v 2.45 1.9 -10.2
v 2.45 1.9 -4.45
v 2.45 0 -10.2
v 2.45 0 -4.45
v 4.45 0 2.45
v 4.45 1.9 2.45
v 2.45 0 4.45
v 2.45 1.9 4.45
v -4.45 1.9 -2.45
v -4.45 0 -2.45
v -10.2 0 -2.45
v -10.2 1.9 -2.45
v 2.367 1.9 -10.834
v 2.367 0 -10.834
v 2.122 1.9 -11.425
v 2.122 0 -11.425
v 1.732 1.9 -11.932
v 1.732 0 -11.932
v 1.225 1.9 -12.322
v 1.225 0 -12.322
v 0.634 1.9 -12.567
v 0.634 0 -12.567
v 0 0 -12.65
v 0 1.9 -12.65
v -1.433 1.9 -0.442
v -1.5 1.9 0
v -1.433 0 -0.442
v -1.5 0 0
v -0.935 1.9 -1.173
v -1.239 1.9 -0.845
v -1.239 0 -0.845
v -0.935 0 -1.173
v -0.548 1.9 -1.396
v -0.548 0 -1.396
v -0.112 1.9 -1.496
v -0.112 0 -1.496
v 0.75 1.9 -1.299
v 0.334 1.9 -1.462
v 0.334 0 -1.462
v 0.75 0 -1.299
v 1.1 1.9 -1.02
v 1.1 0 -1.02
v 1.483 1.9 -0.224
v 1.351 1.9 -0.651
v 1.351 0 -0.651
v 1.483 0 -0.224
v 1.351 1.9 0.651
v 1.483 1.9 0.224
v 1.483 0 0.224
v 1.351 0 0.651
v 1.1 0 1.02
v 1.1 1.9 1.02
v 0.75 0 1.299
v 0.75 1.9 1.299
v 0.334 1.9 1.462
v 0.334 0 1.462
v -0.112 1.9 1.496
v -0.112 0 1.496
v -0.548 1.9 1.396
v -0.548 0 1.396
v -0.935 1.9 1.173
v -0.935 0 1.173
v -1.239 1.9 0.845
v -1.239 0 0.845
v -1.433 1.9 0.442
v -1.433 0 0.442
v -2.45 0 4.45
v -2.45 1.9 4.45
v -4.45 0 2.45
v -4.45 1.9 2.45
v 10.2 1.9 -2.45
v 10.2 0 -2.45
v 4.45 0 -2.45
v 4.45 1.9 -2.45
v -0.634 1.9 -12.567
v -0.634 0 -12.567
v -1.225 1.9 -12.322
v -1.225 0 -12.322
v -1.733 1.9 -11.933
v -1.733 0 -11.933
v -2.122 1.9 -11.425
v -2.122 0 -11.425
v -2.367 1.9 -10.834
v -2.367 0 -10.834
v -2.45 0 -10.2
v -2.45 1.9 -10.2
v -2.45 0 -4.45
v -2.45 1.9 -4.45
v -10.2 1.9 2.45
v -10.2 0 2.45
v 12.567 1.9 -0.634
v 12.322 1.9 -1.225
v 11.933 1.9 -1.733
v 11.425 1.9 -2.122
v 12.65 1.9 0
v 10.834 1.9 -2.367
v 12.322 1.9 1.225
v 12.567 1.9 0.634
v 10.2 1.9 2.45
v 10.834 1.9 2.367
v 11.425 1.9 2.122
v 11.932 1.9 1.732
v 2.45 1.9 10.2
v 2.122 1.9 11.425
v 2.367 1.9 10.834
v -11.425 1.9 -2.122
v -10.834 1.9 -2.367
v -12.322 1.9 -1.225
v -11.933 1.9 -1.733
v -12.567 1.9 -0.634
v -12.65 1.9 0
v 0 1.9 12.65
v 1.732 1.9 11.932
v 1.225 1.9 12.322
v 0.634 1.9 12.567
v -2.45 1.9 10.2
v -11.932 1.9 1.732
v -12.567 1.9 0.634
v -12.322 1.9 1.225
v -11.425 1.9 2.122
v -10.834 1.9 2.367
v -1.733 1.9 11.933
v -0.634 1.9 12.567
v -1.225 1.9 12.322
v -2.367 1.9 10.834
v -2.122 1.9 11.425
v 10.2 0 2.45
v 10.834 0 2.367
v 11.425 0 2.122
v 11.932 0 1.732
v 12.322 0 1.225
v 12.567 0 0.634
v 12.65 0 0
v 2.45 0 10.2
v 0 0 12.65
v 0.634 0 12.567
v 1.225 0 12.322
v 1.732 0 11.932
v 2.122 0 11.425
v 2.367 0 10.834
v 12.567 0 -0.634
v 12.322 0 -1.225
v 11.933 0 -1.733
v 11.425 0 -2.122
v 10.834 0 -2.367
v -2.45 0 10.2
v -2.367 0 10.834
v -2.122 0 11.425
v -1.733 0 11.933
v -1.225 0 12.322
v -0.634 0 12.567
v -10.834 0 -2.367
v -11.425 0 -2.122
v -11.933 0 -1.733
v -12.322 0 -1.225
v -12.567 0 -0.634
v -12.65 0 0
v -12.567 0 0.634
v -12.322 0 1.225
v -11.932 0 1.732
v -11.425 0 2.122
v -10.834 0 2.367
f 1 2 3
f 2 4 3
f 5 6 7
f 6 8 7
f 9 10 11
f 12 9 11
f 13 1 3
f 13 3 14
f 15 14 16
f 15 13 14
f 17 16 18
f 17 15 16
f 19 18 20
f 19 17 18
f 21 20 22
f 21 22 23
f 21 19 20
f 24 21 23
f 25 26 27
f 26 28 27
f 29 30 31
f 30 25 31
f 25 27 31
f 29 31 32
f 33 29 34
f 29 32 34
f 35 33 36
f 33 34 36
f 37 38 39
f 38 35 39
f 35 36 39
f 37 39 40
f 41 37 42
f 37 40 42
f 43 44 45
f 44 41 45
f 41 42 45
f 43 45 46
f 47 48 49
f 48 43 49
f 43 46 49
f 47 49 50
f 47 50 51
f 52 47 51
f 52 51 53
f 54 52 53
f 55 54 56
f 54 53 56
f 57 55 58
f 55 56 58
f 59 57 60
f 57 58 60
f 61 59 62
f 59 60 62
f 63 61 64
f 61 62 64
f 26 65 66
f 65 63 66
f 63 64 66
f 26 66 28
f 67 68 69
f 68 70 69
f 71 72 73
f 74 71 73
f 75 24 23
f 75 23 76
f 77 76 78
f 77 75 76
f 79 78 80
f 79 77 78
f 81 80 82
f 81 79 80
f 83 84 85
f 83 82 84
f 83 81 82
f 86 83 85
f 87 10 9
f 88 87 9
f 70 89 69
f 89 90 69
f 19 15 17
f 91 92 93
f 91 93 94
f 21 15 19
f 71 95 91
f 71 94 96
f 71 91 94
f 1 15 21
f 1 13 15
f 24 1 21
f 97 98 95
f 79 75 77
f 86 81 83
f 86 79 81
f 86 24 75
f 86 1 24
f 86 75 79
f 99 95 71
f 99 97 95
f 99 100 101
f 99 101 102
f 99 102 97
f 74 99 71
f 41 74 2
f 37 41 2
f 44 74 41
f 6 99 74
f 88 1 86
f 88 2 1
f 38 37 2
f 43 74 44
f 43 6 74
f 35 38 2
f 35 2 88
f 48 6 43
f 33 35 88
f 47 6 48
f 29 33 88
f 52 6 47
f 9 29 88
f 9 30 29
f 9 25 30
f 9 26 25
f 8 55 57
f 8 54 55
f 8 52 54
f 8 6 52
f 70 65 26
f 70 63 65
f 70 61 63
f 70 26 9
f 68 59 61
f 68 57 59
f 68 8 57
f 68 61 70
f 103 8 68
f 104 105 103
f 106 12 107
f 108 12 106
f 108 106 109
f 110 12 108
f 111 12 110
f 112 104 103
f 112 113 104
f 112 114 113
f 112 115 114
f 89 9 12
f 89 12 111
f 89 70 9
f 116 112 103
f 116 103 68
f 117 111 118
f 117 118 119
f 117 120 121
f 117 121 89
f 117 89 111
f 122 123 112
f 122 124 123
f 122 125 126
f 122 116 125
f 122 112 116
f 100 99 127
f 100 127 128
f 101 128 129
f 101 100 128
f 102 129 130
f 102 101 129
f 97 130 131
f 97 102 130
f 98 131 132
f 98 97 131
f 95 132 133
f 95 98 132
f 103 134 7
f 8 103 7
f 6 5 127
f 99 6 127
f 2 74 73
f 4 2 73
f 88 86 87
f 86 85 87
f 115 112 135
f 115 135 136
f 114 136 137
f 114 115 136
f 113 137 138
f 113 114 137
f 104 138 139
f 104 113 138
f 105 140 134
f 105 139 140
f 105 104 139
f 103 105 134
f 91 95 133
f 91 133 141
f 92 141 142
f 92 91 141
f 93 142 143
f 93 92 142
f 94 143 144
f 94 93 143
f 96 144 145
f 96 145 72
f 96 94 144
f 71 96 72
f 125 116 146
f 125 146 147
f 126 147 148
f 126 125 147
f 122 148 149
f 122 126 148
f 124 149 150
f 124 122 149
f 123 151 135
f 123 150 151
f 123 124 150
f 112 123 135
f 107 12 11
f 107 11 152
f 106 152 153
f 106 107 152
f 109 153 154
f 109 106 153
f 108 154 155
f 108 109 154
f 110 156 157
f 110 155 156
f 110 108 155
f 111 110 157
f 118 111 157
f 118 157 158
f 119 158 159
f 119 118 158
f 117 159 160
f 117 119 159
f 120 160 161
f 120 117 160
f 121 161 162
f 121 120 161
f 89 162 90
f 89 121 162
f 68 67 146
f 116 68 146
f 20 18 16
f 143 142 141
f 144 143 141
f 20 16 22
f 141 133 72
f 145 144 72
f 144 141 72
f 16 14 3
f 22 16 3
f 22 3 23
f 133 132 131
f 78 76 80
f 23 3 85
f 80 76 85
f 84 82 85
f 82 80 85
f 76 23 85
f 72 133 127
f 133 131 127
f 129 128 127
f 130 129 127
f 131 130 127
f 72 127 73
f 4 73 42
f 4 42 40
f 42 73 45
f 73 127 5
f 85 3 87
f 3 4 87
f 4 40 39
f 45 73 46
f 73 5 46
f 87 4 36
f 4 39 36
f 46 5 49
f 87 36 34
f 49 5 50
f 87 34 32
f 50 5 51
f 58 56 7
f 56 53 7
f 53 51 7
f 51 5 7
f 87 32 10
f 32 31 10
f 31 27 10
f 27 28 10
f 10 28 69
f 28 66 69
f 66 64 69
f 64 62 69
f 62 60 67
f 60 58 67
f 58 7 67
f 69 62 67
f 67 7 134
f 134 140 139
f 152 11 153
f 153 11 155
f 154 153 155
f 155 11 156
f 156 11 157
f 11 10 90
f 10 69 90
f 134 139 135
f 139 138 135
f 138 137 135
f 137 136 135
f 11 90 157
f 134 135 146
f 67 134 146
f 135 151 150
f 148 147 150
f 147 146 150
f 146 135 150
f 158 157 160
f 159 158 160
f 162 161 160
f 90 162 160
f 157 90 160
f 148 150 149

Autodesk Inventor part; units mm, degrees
ref_plane "YZ Plane" through (0, 0, 0) normal (1, 0, 0) x (0, 1, 0)
ref_plane "XZ Plane" through (0, 0, 0) normal (0, 1, 0) x (-1, 0, 0)
ref_plane "XY Plane" through (0, 0, 0) normal (0, 0, 1) x (1, 0, 0)
sketch "Sketch2" plane through (0, 0, 0) normal (0, 1, 0) x (-1, 0, 0)
  line L0 (12.65, -2.45) -> (12.65, 2.45)
  line L1 (-12.65, 2.45) -> (-12.65, -2.45)
  line L2 (-12.65, -2.45) -> (12.65, 2.45) construction
  line L3 (12.65, -2.45) -> (-12.65, 2.45) construction
  line L4 (-2.45, -12.65) -> (2.45, -12.65)
  line L5 (2.45, 12.65) -> (-2.45, 12.65)
  line L6 (-2.45, -12.65) -> (2.45, 12.65) construction
  line L7 (2.45, -12.65) -> (-2.45, 12.65) construction
  line L8 (12.65, 2.45) -> (2.45, 2.45)
  line L9 (-2.45, 2.45) -> (-12.65, 2.45)
  line L10 (2.45, -12.65) -> (2.45, -2.45)
  line L11 (2.45, 2.45) -> (2.45, 12.65)
  line L12 (-12.65, -2.45) -> (-2.45, -2.45)
  line L13 (2.45, -2.45) -> (12.65, -2.45)
  line L14 (-2.45, 12.65) -> (-2.45, 2.45)
  line L15 (-2.45, -2.45) -> (-2.45, -12.65)
  circle A0 centre (0, 0) radius 1.5
  point P0 (0, 0)
  dimension "d7" = 4.9
  dimension "d8" = 4.9
  dimension "d9" = 10.2
  dimension "d10" = 3
extrude "Extrusion2" add sketch "Sketch2" along normal blind 1.9
fillet "Fillet1" radius 2.45 1 edges at (2.45, 0.95, 12.65)
fillet "Fillet2" radius 2.45 1 edges at (-2.45, 0.95, 12.65)
fillet "Fillet3" radius 2.45 1 edges at (12.65, 0.95, 2.45)
fillet "Fillet4" radius 2.45 1 edges at (12.65, 0.95, -2.45)
fillet "Fillet5" radius 2.45 1 edges at (2.45, 0.95, -12.65)
fillet "Fillet6" radius 2.45 1 edges at (-12.65, 0.95, 2.45)
fillet "Fillet7" radius 2.45 1 edges at (-12.65, 0.95, -2.45)
fillet "Fillet8" radius 2.45 1 edges at (-2.45, 0.95, -12.65)
chamfer "Chamfer1" distance 2 angle 45 1 edges at (-2.45, 0.95, -2.45)
chamfer "Chamfer2" distance 2 angle 45 1 edges at (2.45, 0.95, -2.45)
chamfer "Chamfer3" distance 2 angle 45 1 edges at (2.45, 0.95, 2.45)
chamfer "Chamfer4" distance 2 angle 45 1 edges at (-2.45, 0.95, 2.45)
equation "\"d7\" = ServoArmWidth"
equation "\"d8\" = ServoArmWidth"
equation "\"d9\" = ServoArmLength"
equation "\"d10\" = ServoArmHoleRequired"
equation "\"d11\" = ServoArmThickness"
equation "\"d13\" = ServoArmExternFillet"
equation "\"d14\" = ServoArmExternFillet"
equation "\"d15\" = ServoArmExternFillet"
equation "\"d16\" = ServoArmExternFillet"
equation "\"d17\" = ServoArmExternFillet"
equation "\"d18\" = ServoArmExternFillet"
equation "\"d19\" = ServoArmExternFillet"
equation "\"d20\" = ServoArmExternFillet"
equation "\"d21\" = ServoArmInternFillet"
equation "\"d24\" = ServoArmInternFillet"
equation "\"d27\" = ServoArmInternFillet"
equation "\"d30\" = ServoArmInternFillet"
equation "\"ServoArmWidth\" = 4.9"
equation "\"ServoArmSpacing\" = 0.2"
equation "\"ServoArmWidthRequired\" = ServoArmWidth + 2 * ServoArmSpacing"
equation "\"ServoArmLength\" = 10.2"
equation "\"ServoArmLengthRequired\" = ServoArmLength + 2 * ServoArmSpacing"
equation "\"ServoArmThickness\" = 1.9"
equation "\"ServoArmHoleRequired\" = 3"
equation "\"ServoArmInternFillet\" = 2"
equation "\"ServoArmExternFillet\" = 0.5 * ServoArmWidth"
equation "\"ServoArmHeadScrewTrace\" = 5.5"
equation "\"ServoArmHeadScrewThickness\" = 2.5"
properties part number "SimplifiedServoArm"
